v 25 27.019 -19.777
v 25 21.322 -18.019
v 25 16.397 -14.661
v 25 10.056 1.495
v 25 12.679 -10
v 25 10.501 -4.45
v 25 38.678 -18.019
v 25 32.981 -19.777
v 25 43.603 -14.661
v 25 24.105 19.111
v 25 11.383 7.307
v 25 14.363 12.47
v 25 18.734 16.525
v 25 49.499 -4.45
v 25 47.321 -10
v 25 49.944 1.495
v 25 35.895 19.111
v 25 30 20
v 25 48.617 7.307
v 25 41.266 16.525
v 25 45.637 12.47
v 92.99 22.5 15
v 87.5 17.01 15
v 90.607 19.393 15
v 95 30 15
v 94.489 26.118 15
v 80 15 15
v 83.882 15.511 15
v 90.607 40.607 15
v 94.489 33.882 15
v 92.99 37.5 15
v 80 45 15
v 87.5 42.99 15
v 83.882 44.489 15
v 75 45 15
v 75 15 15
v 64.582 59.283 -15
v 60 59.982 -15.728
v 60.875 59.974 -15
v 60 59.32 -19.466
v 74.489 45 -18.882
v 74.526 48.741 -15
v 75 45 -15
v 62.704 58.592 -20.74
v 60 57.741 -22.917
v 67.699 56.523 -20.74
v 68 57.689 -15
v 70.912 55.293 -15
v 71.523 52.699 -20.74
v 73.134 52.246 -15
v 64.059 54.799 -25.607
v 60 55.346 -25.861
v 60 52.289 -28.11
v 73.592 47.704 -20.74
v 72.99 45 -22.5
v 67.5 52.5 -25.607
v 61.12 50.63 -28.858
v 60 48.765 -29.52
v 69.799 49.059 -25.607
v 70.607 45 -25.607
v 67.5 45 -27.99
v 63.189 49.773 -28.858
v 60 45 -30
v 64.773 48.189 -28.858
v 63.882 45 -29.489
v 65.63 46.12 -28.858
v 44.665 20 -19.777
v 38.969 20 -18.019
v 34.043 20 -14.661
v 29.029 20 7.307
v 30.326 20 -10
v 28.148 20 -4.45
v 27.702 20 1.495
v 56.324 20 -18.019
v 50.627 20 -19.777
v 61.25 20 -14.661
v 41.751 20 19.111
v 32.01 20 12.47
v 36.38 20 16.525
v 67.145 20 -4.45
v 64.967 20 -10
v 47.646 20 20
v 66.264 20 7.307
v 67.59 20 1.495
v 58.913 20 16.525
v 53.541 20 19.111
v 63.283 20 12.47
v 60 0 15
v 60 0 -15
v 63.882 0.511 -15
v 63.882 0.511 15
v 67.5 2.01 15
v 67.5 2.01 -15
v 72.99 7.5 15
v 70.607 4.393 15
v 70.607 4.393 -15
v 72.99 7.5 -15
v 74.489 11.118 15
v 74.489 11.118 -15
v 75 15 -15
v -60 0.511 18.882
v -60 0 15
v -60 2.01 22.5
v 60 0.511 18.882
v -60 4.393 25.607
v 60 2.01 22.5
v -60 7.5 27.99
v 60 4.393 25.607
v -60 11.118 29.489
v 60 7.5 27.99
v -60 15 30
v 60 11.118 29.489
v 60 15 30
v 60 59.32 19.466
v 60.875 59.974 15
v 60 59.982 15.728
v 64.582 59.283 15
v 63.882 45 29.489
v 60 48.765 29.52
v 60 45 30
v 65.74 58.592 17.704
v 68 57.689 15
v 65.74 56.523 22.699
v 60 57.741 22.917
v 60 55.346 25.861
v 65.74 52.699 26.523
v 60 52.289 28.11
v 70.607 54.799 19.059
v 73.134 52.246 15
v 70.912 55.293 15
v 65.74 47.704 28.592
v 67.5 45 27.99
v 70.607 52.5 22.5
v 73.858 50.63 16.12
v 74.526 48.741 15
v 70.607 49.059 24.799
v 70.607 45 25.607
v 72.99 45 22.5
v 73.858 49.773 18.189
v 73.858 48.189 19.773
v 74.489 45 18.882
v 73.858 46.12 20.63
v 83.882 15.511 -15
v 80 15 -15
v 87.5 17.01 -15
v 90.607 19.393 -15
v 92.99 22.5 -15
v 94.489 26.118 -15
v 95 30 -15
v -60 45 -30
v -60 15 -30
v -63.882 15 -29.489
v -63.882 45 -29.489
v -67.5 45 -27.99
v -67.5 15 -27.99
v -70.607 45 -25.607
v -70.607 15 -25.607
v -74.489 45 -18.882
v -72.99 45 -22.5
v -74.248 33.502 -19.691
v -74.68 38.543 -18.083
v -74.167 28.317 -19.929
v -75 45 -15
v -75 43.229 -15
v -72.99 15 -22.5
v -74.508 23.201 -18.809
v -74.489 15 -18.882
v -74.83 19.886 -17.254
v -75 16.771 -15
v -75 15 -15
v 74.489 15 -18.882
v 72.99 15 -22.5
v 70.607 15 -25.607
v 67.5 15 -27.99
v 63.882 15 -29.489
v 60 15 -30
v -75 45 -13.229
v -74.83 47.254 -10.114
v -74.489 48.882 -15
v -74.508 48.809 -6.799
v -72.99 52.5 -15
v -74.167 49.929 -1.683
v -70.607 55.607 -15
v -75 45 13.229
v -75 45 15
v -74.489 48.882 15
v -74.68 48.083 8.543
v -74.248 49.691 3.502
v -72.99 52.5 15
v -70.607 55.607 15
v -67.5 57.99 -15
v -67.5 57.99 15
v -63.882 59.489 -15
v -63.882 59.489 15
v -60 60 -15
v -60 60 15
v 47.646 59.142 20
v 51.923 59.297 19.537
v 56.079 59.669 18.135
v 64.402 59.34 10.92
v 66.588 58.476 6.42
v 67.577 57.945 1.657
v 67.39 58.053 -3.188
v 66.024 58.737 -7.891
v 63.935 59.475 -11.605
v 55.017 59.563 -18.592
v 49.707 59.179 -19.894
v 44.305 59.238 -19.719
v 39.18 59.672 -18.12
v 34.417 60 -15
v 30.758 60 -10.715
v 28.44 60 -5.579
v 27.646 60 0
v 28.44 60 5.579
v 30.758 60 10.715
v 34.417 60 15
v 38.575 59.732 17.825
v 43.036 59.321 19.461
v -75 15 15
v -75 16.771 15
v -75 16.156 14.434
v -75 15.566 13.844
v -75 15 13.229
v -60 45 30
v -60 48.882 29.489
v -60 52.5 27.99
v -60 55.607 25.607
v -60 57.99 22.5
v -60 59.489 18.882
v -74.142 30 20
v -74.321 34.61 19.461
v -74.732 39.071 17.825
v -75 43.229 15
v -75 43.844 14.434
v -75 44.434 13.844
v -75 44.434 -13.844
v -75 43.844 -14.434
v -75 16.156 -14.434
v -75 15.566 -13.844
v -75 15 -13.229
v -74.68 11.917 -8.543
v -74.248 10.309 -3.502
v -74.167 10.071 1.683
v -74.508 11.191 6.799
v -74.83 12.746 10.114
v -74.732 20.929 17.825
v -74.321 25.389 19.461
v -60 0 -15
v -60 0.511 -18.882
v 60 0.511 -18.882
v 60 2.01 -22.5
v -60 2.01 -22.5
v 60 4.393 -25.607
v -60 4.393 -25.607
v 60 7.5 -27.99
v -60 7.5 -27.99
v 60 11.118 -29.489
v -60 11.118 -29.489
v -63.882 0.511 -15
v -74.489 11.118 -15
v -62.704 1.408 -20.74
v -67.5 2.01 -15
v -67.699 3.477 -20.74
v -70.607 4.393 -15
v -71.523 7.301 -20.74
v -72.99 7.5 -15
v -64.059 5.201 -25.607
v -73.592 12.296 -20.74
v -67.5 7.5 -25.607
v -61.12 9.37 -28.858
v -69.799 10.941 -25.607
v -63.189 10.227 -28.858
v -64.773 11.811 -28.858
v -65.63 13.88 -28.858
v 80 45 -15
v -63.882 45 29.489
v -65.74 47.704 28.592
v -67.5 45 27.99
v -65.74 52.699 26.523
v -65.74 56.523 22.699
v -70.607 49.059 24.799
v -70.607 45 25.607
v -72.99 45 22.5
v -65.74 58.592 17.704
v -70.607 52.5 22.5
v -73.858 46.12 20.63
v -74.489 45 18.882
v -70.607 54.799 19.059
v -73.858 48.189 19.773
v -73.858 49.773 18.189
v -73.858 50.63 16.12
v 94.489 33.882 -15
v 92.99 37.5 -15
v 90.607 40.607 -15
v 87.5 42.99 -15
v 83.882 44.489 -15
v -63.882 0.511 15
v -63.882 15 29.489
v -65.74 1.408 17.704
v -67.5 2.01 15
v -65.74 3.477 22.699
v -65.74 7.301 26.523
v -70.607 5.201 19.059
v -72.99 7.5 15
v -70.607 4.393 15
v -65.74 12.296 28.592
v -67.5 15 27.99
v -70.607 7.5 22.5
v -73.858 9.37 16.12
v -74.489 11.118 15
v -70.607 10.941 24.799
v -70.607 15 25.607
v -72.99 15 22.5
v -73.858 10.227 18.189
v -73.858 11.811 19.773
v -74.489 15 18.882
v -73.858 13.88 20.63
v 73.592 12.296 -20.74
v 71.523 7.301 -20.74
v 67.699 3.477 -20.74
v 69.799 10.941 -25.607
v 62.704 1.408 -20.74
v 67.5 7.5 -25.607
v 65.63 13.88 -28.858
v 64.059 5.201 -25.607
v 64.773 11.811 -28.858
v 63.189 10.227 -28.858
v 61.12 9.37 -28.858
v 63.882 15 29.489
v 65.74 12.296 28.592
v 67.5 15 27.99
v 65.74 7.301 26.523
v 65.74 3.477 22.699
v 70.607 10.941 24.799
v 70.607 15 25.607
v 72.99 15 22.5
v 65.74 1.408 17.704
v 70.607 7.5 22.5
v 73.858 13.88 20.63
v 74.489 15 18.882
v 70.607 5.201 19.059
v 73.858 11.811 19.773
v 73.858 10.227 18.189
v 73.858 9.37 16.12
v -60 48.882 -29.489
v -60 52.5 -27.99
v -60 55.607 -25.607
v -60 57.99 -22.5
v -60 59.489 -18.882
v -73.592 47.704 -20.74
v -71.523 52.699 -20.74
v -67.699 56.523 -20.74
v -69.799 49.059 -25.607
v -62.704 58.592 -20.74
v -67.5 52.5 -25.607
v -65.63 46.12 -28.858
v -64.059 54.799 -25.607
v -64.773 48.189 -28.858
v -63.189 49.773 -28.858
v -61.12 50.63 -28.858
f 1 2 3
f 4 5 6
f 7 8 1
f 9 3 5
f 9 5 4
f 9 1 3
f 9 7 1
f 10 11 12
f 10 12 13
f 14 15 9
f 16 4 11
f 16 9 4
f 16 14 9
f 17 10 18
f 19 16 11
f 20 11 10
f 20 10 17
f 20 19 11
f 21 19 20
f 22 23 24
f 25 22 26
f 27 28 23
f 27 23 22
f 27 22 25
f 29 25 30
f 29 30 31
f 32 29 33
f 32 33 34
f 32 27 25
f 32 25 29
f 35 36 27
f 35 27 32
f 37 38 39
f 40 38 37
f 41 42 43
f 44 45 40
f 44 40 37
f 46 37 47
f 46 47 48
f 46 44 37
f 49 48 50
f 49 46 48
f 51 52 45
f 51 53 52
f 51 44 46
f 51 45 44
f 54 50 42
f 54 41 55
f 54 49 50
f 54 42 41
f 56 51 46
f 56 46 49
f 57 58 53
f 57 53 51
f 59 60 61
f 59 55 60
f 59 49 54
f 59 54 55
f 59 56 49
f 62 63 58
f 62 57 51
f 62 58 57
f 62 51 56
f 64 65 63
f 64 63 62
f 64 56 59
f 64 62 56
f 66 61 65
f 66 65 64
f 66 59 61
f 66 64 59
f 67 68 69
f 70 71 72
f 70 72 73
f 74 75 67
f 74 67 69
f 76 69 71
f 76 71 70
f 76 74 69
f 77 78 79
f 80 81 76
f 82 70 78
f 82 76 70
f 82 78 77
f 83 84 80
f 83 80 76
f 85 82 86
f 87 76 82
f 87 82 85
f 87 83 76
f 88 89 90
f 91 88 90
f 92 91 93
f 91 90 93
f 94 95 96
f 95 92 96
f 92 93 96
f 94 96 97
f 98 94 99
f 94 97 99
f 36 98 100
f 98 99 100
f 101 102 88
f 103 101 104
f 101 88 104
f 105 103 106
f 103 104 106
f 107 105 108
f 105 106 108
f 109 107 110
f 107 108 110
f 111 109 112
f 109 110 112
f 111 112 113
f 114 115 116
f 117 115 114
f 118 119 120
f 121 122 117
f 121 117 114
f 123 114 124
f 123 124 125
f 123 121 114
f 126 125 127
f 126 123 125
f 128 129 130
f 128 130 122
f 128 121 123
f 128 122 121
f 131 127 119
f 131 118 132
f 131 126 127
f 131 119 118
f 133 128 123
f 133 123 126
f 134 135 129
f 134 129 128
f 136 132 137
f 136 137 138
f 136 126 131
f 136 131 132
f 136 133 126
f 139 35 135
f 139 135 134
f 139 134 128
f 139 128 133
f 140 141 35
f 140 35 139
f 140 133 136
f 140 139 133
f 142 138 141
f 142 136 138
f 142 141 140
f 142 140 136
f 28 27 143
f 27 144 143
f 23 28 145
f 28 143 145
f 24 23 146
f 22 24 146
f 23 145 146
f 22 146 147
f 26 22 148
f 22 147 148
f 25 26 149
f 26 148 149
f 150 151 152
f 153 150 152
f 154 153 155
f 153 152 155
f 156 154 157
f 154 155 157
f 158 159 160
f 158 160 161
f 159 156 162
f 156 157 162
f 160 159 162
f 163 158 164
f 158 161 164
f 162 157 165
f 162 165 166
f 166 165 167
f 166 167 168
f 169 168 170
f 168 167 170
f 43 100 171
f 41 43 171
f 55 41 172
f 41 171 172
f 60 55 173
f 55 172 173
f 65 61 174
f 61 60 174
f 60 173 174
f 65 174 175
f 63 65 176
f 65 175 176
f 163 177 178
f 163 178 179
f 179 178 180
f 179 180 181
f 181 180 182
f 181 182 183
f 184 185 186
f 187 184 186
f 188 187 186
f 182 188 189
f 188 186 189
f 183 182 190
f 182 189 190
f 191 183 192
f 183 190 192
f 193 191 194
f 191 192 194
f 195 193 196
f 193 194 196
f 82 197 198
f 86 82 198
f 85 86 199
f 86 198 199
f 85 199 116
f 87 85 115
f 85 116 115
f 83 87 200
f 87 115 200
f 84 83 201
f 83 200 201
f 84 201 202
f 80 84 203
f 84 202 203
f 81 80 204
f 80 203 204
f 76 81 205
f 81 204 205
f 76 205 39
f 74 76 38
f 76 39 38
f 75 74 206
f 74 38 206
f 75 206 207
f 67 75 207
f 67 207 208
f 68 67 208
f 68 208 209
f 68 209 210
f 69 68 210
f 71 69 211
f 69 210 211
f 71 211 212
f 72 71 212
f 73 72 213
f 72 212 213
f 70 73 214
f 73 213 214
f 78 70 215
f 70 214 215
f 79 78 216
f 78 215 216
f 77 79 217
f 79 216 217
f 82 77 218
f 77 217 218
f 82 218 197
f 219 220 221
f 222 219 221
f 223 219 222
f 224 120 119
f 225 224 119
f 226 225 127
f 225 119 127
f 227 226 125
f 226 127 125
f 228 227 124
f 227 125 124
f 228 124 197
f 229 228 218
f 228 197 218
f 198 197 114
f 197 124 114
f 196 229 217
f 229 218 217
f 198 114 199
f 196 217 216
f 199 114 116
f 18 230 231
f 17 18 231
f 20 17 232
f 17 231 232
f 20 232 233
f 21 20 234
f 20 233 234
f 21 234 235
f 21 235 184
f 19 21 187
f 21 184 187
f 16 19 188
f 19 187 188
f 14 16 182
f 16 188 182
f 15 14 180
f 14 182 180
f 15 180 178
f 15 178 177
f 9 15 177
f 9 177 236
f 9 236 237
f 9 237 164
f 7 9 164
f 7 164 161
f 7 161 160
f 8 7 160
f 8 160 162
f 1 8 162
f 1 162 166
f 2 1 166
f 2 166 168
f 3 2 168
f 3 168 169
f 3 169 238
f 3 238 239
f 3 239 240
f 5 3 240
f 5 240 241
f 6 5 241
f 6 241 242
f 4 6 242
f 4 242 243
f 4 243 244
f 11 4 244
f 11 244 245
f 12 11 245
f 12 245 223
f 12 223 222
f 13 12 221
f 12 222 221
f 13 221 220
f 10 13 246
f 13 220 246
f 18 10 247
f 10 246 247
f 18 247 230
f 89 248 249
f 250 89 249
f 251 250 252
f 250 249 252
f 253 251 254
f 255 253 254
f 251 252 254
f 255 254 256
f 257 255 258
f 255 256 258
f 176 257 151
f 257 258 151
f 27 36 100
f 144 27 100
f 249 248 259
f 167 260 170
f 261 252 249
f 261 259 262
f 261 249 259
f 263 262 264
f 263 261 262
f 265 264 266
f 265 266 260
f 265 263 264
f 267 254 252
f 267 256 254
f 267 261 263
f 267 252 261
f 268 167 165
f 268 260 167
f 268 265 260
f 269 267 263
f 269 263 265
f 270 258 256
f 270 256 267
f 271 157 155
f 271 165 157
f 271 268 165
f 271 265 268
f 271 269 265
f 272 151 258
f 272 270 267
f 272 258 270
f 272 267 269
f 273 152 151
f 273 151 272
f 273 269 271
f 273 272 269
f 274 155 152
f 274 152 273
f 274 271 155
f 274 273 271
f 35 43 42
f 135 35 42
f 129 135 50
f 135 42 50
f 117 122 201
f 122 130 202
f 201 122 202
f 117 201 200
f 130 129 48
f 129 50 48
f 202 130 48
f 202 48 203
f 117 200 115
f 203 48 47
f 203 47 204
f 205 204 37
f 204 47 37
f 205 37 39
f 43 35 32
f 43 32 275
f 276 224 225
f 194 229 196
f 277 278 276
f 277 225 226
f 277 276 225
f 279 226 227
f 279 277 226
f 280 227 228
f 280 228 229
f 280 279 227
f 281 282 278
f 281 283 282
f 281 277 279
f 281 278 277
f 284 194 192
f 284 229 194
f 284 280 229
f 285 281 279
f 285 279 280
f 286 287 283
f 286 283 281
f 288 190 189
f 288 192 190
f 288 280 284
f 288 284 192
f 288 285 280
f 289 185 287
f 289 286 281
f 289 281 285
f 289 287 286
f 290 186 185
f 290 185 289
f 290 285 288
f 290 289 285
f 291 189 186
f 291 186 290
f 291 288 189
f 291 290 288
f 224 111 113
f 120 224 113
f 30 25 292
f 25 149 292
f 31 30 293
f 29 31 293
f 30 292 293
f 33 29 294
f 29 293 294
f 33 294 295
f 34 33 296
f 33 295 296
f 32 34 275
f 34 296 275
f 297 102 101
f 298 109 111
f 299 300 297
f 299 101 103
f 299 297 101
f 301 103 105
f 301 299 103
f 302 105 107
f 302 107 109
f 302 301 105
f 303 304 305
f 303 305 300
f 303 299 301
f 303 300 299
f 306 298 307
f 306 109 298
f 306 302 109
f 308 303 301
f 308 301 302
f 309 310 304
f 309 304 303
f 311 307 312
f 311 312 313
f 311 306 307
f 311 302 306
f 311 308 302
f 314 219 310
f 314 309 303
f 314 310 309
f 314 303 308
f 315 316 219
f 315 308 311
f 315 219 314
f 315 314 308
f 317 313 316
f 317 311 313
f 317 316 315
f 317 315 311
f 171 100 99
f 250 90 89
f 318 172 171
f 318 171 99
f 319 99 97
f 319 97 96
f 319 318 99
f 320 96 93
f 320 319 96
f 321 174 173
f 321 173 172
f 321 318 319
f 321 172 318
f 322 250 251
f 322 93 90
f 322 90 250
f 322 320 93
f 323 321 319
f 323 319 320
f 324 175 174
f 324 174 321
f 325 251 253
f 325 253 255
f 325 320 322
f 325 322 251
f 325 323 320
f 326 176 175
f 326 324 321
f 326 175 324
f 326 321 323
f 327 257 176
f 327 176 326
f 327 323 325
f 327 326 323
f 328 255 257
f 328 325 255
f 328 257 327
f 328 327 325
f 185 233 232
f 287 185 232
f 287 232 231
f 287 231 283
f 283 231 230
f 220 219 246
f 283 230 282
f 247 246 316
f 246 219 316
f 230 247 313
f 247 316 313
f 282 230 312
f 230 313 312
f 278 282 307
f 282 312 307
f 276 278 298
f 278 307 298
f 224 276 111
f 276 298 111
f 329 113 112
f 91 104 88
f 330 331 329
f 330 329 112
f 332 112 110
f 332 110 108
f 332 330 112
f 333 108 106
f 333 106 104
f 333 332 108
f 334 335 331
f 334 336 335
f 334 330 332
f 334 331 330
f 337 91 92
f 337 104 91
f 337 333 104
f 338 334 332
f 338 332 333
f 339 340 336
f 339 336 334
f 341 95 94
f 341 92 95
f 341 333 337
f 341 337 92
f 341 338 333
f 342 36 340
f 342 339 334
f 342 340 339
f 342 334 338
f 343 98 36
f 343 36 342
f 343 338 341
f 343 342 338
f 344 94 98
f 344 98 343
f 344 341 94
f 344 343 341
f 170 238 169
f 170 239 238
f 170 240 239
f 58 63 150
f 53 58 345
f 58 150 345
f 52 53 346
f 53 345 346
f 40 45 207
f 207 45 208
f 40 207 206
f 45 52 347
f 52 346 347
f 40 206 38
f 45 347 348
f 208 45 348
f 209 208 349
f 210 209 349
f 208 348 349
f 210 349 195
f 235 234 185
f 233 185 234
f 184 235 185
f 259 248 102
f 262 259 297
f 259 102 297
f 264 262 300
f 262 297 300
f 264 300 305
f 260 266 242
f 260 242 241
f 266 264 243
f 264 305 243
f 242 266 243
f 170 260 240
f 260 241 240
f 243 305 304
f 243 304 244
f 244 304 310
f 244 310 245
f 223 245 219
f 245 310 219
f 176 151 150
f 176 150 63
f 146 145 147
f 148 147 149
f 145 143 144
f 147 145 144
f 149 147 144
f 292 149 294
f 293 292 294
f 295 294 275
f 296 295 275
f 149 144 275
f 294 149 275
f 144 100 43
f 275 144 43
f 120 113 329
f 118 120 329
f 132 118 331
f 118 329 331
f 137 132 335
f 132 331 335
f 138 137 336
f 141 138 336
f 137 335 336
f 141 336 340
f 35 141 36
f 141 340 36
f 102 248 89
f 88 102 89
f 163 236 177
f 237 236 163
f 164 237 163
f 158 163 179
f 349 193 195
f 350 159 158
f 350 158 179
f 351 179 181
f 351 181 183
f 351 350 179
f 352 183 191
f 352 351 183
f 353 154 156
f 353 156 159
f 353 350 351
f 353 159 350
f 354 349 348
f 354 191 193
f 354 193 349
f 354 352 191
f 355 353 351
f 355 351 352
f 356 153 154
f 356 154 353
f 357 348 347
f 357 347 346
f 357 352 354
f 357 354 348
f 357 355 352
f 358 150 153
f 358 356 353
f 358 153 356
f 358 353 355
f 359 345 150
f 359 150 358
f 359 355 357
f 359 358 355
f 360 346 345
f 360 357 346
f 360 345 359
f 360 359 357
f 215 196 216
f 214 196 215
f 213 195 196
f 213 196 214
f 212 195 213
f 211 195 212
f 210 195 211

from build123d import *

# Parameters (mm, degrees)
SKETCH1_W           = 150
SKETCH1_H           = 60
BOSS_EXTRUDE3_DEPTH = 60
SKETCH3_R           = 20
CUT_EXTRUDE1_DEPTH  = 100
FILLET1_R           = 15
SKETCH5_R           = 20
CUT_EXTRUDE2_DEPTH  = 40
SKETCH6_W           = 30
SKETCH6_H           = 30
BOSS_EXTRUDE4_DEPTH = 20
FILLET4_R           = 15
FILLET5_R           = 15


# Some blends are built 0.0001 mm under size
with BuildPart() as part:
    # Sketch1 → Boss-Extrude3 (new body)
    with BuildSketch(Plane(origin=(0, 0, 0), x_dir=(1, 0, 0), z_dir=(0, 1, 0))):
        Rectangle(SKETCH1_W, SKETCH1_H)
    extrude(amount=BOSS_EXTRUDE3_DEPTH)

    # Sketch3 → Cut-Extrude1 (cut)
    with BuildSketch(Plane.ZY.offset(75)):
        with Locations((0, 30)):
            Circle(SKETCH3_R)
    extrude(amount=-CUT_EXTRUDE1_DEPTH, mode=Mode.SUBTRACT)

    # Fillet1
    # the kernel refuses this fillet: 15 mm, written as the material it takes off along each edge
    with BuildSketch(Plane(origin=(-60, 45, 15), x_dir=(0, 1, 0), z_dir=(-1, 0, 0))) as fillet1_piece_1_section:
        Polygon((0, 0), (FILLET1_R, 0), (FILLET1_R, -FILLET1_R), (0, -FILLET1_R), align=None)
    fillet1_piece_1 = extrude(amount=FILLET1_R, mode=Mode.PRIVATE)
    fillet1_piece_1 = fillet1_piece_1 - Plane(origin=(-60, 45, 15), x_dir=(0, -0.7071067811865475, -0.7071067811865475), z_dir=(-1, 0, 0)) * Sphere(FILLET1_R, mode=Mode.PRIVATE)
    add(fillet1_piece_1, mode=Mode.SUBTRACT)
    with BuildSketch(Plane(origin=(-60, 45, -15), x_dir=(-1, 0, 0), z_dir=(0, 0, -1))) as fillet1_piece_2_section:
        Polygon((0, 0), (FILLET1_R, 0), (FILLET1_R, FILLET1_R), (0, FILLET1_R), align=None)
    fillet1_piece_2 = extrude(amount=FILLET1_R, mode=Mode.PRIVATE)
    fillet1_piece_2 = fillet1_piece_2 - Plane(origin=(-60, 45, -15), x_dir=(0.7071067811865475, -0.7071067811865475, 0), z_dir=(0, 0, -1)) * Sphere(FILLET1_R, mode=Mode.PRIVATE)
    add(fillet1_piece_2, mode=Mode.SUBTRACT)
    with BuildSketch(Plane(origin=(60, 45, 15), x_dir=(0, 1, 0), z_dir=(1, 0, 0))) as fillet1_piece_3_section:
        Polygon((0, 0), (FILLET1_R, 0), (FILLET1_R, FILLET1_R), (0, FILLET1_R), align=None)
    fillet1_piece_3 = extrude(amount=FILLET1_R, mode=Mode.PRIVATE)
    fillet1_piece_3 = fillet1_piece_3 - Plane(origin=(60, 45, 15), x_dir=(0, -0.7071067811865475, -0.7071067811865475), z_dir=(1, 0, 0)) * Sphere(FILLET1_R, mode=Mode.PRIVATE)
    add(fillet1_piece_3, mode=Mode.SUBTRACT)
    with BuildSketch(Plane(origin=(60, 45, -15), x_dir=(1, 0, 0), z_dir=(0, 0, -1))) as fillet1_piece_4_section:
        Polygon((0, 0), (FILLET1_R, 0), (FILLET1_R, -FILLET1_R), (0, -FILLET1_R), align=None)
    fillet1_piece_4 = extrude(amount=FILLET1_R, mode=Mode.PRIVATE)
    fillet1_piece_4 = fillet1_piece_4 - Plane(origin=(60, 45, -15), x_dir=(-0.7071067811865475, -0.7071067811865475, 0), z_dir=(0, 0, -1)) * Sphere(FILLET1_R, mode=Mode.PRIVATE)
    add(fillet1_piece_4, mode=Mode.SUBTRACT)
    with BuildSketch(Plane(origin=(60, 15, 15), x_dir=(0, -1, 0), z_dir=(1, 0, 0))) as fillet1_piece_5_section:
        Polygon((0, 0), (FILLET1_R, 0), (FILLET1_R, -FILLET1_R), (0, -FILLET1_R), align=None)
    fillet1_piece_5 = extrude(amount=FILLET1_R, mode=Mode.PRIVATE)
    fillet1_piece_5 = fillet1_piece_5 - Plane(origin=(60, 15, 15), x_dir=(0, 0.7071067811865475, -0.7071067811865475), z_dir=(1, 0, 0)) * Sphere(FILLET1_R, mode=Mode.PRIVATE)
    add(fillet1_piece_5, mode=Mode.SUBTRACT)
    with BuildSketch(Plane(origin=(-60, 15, 15), x_dir=(0, -1, 0), z_dir=(-1, 0, 0))) as fillet1_piece_6_section:
        Polygon((0, 0), (FILLET1_R, 0), (FILLET1_R, FILLET1_R), (0, FILLET1_R), align=None)
    fillet1_piece_6 = extrude(amount=FILLET1_R, mode=Mode.PRIVATE)
    fillet1_piece_6 = fillet1_piece_6 - Plane(origin=(-60, 15, 15), x_dir=(0, 0.7071067811865475, -0.7071067811865475), z_dir=(-1, 0, 0)) * Sphere(FILLET1_R, mode=Mode.PRIVATE)
    add(fillet1_piece_6, mode=Mode.SUBTRACT)
    with BuildSketch(Plane(origin=(-60, 15, -15), x_dir=(-1, 0, 0), z_dir=(0, 0, -1))) as fillet1_piece_7_section:
        Polygon((0, 0), (FILLET1_R, 0), (FILLET1_R, -FILLET1_R), (0, -FILLET1_R), align=None)
    fillet1_piece_7 = extrude(amount=FILLET1_R, mode=Mode.PRIVATE)
    fillet1_piece_7 = fillet1_piece_7 - Plane(origin=(-60, 15, -15), x_dir=(0.7071067811865475, 0.7071067811865475, 0), z_dir=(0, 0, -1)) * Sphere(FILLET1_R, mode=Mode.PRIVATE)
    add(fillet1_piece_7, mode=Mode.SUBTRACT)
    with BuildSketch(Plane(origin=(60, 15, -15), x_dir=(1, 0, 0), z_dir=(0, 0, -1))) as fillet1_piece_8_section:
        Polygon((0, 0), (FILLET1_R, 0), (FILLET1_R, FILLET1_R), (0, FILLET1_R), align=None)
    fillet1_piece_8 = extrude(amount=FILLET1_R, mode=Mode.PRIVATE)
    fillet1_piece_8 = fillet1_piece_8 - Plane(origin=(60, 15, -15), x_dir=(-0.7071067811865475, 0.7071067811865475, 0), z_dir=(0, 0, -1)) * Sphere(FILLET1_R, mode=Mode.PRIVATE)
    add(fillet1_piece_8, mode=Mode.SUBTRACT)
    with BuildSketch(Plane(origin=(-75, 60, 15), x_dir=(0, -1, 0), z_dir=(0, 0, -1)), Plane(origin=(75, 60, -15), x_dir=(0, -1, 0), z_dir=(0, 0, 1)), Plane(origin=(-75, 15, 30), x_dir=(0, 0, -1), z_dir=(0, 1, 0)), Plane(origin=(-75, 15, -30), x_dir=(1, 0, 0), z_dir=(0, 1, 0))) as fillet1_piece_9:
        with BuildLine():
            CenterArc((FILLET1_R, -FILLET1_R), FILLET1_R, 90, 90)
            Line((0, -FILLET1_R), (0, 0))
            Line((0, 0), (FILLET1_R, 0))
        make_face()
    extrude(amount=30, mode=Mode.SUBTRACT)
    with BuildSketch(Plane(origin=(60, 60, 30), x_dir=(0, 0, -1), z_dir=(-1, 0, 0)), Plane(origin=(-60, 0, -30), x_dir=(0, 1, 0), z_dir=(1, 0, 0))) as fillet1_piece_10:
        with BuildLine():
            CenterArc((FILLET1_R, FILLET1_R), FILLET1_R, 180, 90)
            Line((0, FILLET1_R), (0, 0))
            Line((0, 0), (FILLET1_R, 0))
        make_face()
    extrude(amount=120, mode=Mode.SUBTRACT)
    with BuildSketch(Plane(origin=(60, 0, 30), x_dir=(0, 0, -1), z_dir=(-1, 0, 0)), Plane(origin=(-60, 60, -30), x_dir=(0, -1, 0), z_dir=(1, 0, 0))) as fillet1_piece_11:
        with BuildLine():
            CenterArc((FILLET1_R, -FILLET1_R), FILLET1_R, 90, 90)
            Line((0, -FILLET1_R), (0, 0))
            Line((0, 0), (FILLET1_R, 0))
        make_face()
    extrude(amount=120, mode=Mode.SUBTRACT)
    with BuildSketch(Plane(origin=(-75, 0, 15), x_dir=(0, 1, 0), z_dir=(0, 0, -1)), Plane(origin=(75, 0, -15), x_dir=(0, 1, 0), z_dir=(0, 0, 1)), Plane(origin=(75, 15, 30), x_dir=(0, 0, -1), z_dir=(0, 1, 0)), Plane(origin=(75, 15, -30), x_dir=(-1, 0, 0), z_dir=(0, 1, 0))) as fillet1_piece_12:
        with BuildLine():
            CenterArc((FILLET1_R, FILLET1_R), FILLET1_R, 180, 90)
            Line((0, FILLET1_R), (0, 0))
            Line((0, 0), (FILLET1_R, 0))
        make_face()
    extrude(amount=30, mode=Mode.SUBTRACT)

    # Sketch5 → Cut-Extrude2 (cut)
    with BuildSketch(Plane(origin=(0, 60, 0), x_dir=(1, 0, 0), z_dir=(0, 1, 0))):
        with Locations(Location((47.646230656, 0, 0), (0, 0, 270))):
            Circle(SKETCH5_R)
    extrude(amount=-CUT_EXTRUDE2_DEPTH, mode=Mode.SUBTRACT)

    # Sketch6 → Boss-Extrude4 (add)
    with BuildSketch(Plane(origin=(75, 0, 0), x_dir=(0, 0, -1), z_dir=(1, 0, 0))):
        with Locations((0, 30)):
            Rectangle(SKETCH6_W, SKETCH6_H)
    extrude(amount=BOSS_EXTRUDE4_DEPTH)

    # Fillet4
    fillet4_edges = [part.edges().sort_by_distance(p)[0] for p in [
        (95, 15, 0),
    ]]
    fillet(fillet4_edges, radius=FILLET4_R)

    # Fillet5
    fillet5_edges = [part.edges().sort_by_distance(p)[0] for p in [
        (95, 45, 0),
    ]]
    fillet(fillet5_edges, radius=FILLET5_R - 0.0001)  # a hair under: the kernel refuses the full size


solid = part.part
